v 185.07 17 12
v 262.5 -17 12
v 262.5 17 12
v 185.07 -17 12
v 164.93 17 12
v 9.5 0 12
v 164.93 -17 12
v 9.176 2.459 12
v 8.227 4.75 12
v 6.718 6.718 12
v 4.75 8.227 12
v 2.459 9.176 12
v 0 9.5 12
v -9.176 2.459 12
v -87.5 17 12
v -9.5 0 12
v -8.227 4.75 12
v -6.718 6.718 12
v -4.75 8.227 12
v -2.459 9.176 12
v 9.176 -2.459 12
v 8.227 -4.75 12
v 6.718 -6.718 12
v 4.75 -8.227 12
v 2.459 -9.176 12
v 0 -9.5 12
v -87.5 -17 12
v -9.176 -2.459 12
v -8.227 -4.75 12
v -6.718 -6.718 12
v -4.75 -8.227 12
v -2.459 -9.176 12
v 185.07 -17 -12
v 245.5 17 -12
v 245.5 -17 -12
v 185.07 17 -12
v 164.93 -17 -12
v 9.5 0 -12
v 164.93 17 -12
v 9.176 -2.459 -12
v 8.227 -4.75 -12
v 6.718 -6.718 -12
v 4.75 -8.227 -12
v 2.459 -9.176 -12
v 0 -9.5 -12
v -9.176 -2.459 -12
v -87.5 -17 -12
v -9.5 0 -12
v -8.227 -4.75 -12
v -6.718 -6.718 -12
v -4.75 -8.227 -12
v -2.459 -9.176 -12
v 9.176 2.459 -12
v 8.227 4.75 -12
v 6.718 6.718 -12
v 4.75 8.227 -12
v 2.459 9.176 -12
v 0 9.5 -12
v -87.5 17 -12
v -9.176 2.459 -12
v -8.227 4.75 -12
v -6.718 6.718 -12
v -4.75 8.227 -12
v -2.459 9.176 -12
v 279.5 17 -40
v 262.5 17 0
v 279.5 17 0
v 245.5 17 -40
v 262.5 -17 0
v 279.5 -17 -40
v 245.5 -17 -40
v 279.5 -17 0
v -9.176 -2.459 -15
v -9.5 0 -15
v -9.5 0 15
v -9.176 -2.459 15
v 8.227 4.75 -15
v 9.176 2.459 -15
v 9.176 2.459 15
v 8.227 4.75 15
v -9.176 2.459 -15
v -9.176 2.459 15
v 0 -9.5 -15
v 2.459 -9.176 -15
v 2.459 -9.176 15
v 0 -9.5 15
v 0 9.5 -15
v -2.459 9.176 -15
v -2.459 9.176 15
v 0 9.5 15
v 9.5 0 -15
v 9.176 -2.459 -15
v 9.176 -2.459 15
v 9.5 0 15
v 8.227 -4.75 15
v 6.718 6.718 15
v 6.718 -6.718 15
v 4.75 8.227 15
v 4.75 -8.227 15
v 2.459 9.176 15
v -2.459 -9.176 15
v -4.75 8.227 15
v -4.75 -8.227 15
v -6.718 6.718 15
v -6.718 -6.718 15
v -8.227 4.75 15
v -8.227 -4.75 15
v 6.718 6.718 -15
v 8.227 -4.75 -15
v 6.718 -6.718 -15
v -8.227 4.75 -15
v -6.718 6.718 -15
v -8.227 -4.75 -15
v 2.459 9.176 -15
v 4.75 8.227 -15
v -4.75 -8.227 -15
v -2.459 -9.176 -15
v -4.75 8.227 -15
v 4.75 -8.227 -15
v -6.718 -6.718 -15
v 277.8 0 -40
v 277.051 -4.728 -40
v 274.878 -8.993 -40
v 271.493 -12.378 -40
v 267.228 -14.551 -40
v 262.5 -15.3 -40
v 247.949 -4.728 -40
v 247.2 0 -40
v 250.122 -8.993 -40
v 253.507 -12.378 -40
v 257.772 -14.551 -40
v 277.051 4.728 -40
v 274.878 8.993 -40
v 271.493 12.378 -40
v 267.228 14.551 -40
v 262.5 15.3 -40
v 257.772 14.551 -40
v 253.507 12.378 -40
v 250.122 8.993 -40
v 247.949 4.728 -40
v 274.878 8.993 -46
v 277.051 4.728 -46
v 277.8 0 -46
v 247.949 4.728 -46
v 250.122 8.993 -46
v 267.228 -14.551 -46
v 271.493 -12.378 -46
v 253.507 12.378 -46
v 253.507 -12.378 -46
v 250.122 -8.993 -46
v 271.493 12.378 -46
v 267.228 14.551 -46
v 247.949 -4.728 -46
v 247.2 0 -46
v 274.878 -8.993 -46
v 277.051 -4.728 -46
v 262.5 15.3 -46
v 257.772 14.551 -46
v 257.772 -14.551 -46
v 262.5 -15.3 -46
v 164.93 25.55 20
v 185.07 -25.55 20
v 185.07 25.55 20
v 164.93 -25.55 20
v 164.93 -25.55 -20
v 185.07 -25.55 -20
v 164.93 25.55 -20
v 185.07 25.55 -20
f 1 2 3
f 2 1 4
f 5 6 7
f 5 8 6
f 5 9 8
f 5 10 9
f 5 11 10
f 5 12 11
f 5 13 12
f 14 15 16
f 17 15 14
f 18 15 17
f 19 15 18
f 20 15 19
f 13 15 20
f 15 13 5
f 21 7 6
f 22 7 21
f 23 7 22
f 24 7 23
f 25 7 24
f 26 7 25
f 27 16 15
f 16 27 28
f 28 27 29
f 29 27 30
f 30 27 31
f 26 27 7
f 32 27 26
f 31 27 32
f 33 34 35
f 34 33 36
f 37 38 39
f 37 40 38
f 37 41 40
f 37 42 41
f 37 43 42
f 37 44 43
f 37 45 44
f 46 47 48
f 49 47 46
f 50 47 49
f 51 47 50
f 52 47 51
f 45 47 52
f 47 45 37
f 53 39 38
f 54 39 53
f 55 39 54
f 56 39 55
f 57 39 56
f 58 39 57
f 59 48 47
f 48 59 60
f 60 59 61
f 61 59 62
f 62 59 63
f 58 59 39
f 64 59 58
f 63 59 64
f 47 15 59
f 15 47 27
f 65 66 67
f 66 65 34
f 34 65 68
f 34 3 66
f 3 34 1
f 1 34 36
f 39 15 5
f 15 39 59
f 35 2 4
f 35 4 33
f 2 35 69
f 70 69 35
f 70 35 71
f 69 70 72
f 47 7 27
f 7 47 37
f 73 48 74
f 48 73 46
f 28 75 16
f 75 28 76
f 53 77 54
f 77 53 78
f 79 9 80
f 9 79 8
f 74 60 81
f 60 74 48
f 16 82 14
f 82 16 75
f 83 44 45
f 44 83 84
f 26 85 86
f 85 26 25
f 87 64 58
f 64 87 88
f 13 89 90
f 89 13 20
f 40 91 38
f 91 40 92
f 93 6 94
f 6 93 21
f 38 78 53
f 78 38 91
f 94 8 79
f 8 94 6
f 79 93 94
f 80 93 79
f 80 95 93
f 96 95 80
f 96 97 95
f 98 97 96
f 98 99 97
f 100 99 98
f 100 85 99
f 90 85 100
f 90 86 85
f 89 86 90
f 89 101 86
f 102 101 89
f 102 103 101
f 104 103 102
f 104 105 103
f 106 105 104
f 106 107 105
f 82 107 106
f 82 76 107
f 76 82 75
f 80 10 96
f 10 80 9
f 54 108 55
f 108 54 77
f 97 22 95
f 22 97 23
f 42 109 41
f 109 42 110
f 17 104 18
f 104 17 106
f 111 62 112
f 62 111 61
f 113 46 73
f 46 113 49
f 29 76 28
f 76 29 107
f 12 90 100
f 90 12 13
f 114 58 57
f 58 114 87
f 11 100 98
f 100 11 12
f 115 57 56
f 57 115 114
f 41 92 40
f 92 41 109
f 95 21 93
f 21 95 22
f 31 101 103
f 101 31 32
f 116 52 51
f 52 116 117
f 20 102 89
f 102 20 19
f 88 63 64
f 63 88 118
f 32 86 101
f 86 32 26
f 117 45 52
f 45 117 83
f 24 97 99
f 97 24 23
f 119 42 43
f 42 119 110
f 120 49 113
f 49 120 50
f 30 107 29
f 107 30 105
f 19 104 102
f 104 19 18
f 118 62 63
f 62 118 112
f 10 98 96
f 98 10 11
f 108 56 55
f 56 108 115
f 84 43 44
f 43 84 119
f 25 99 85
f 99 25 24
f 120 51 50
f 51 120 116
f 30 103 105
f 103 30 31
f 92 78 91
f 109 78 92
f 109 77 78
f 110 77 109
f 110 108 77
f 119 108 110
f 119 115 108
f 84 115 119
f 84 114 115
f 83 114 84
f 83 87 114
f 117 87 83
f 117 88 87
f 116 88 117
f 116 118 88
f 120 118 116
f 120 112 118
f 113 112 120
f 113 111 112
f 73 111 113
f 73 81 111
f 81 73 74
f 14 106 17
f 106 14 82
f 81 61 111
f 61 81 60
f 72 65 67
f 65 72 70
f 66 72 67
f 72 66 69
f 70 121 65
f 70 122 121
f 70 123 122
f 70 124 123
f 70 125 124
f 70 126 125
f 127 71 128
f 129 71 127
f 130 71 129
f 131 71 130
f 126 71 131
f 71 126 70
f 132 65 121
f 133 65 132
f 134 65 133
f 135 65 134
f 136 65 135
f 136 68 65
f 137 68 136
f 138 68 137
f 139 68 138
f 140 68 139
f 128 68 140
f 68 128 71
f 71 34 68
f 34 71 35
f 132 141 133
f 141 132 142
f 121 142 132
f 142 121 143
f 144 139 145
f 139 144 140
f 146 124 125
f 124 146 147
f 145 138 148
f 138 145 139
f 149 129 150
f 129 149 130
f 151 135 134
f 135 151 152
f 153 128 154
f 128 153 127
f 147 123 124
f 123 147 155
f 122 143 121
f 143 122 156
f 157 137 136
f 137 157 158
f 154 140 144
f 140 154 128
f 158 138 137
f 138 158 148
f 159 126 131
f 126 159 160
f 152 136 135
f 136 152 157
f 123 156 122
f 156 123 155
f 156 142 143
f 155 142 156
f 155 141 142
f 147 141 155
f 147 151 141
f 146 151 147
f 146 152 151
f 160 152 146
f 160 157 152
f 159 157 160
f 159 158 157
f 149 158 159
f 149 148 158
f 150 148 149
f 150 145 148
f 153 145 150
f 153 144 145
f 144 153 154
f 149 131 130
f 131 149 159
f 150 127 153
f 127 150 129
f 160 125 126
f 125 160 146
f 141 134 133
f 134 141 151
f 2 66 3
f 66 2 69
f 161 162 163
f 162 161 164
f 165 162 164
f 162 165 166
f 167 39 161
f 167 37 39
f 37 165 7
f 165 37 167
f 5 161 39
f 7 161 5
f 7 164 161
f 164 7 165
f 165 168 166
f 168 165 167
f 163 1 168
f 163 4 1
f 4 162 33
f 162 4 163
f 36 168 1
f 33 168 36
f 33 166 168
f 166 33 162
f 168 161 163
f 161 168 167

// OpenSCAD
// file: ori_params.scad
// ori_params.scad — Ori Robot Dog master parameters (mirrors Parameters/master_parameters.py)
//
// NOTE: These OpenSCAD files are a parametric, human/AI-READABLE summary of Ori.
// The authoritative, higher-fidelity manufactured geometry is the STEP files in the
// CAD_STEP/ folder of this package (NOT here, but still present). Use those for printing.
//
// All dims in millimetres. These are representative values for a readable/viewable model;
// the Python/CadQuery source (Source/) and STEP exports are the source of truth.

// Robot scale
overall_height = 364;
hip_height     = 300;
ground_clear   = 190;

// Stance
stance_length  = 437;
stance_width   = 168;

// Legs (upper = lower = 175)
link_len = 175;
link_w   = 34;
link_t   = 24;
foot_h   = 40;

// Torso (split at x=0 into two halves)
torso_len = 320;
torso_w   = 150;
torso_h   = 110;

// Head
head_d   = 90;

// Arm (6-DOF), mounted front +X
arm_base_x = 140;
arm_yaw_h  = 30;
arm_upper  = 70;
arm_fore   = 60;
arm_wrist  = 28;
grip_r     = 17;   // coupler radius
finger_len = 30;

// Servo (Hiwonder HTD-45H) envelope
servo_l = 51.1;
servo_w = 20.14;
servo_h = 40;

// Bearing (626ZZ)
bearing_od = 19;
bearing_id = 6;
bearing_w  = 6;
// main file
// ori_leg.scad — one canonical leg (hip-yaw / hip-pitch / knee / ankle / foot)
// Mirrors CAD/Legs/master_leg.py. Readable summary, not the manufactured part.
include <ori_params.scad>

module htd45h() {
  color("silver") cube([servo_l, servo_w, servo_h], center=true);
}

module upper_link() {
  color("darkgreen") {
    cube([link_len, link_w, link_t], center=true);
    cylinder(r=bearing_od/2, h=link_t+6, center=true, $fn=24);
  }
}

module lower_link() {
  color("green") cube([link_len, link_w, link_t], center=true);
}

module foot() {
  color("orange") {
    cube([link_w, link_w, foot_h], center=true);
    translate([0,0,-foot_h/2-3]) cylinder(r=link_w*0.45, h=6, center=true, $fn=20);
  }
}

// Canonical leg: hip at origin, links run +X, foot at far end.
module leg_canonical() {
  upper_link();
  translate([link_len,0,0]) rotate([0,0,90]) htd45h();   // knee servo
  translate([link_len,0,0]) {
    lower_link();
    translate([link_len/2,0,-foot_h/2]) foot();
  }
}

leg_canonical();
